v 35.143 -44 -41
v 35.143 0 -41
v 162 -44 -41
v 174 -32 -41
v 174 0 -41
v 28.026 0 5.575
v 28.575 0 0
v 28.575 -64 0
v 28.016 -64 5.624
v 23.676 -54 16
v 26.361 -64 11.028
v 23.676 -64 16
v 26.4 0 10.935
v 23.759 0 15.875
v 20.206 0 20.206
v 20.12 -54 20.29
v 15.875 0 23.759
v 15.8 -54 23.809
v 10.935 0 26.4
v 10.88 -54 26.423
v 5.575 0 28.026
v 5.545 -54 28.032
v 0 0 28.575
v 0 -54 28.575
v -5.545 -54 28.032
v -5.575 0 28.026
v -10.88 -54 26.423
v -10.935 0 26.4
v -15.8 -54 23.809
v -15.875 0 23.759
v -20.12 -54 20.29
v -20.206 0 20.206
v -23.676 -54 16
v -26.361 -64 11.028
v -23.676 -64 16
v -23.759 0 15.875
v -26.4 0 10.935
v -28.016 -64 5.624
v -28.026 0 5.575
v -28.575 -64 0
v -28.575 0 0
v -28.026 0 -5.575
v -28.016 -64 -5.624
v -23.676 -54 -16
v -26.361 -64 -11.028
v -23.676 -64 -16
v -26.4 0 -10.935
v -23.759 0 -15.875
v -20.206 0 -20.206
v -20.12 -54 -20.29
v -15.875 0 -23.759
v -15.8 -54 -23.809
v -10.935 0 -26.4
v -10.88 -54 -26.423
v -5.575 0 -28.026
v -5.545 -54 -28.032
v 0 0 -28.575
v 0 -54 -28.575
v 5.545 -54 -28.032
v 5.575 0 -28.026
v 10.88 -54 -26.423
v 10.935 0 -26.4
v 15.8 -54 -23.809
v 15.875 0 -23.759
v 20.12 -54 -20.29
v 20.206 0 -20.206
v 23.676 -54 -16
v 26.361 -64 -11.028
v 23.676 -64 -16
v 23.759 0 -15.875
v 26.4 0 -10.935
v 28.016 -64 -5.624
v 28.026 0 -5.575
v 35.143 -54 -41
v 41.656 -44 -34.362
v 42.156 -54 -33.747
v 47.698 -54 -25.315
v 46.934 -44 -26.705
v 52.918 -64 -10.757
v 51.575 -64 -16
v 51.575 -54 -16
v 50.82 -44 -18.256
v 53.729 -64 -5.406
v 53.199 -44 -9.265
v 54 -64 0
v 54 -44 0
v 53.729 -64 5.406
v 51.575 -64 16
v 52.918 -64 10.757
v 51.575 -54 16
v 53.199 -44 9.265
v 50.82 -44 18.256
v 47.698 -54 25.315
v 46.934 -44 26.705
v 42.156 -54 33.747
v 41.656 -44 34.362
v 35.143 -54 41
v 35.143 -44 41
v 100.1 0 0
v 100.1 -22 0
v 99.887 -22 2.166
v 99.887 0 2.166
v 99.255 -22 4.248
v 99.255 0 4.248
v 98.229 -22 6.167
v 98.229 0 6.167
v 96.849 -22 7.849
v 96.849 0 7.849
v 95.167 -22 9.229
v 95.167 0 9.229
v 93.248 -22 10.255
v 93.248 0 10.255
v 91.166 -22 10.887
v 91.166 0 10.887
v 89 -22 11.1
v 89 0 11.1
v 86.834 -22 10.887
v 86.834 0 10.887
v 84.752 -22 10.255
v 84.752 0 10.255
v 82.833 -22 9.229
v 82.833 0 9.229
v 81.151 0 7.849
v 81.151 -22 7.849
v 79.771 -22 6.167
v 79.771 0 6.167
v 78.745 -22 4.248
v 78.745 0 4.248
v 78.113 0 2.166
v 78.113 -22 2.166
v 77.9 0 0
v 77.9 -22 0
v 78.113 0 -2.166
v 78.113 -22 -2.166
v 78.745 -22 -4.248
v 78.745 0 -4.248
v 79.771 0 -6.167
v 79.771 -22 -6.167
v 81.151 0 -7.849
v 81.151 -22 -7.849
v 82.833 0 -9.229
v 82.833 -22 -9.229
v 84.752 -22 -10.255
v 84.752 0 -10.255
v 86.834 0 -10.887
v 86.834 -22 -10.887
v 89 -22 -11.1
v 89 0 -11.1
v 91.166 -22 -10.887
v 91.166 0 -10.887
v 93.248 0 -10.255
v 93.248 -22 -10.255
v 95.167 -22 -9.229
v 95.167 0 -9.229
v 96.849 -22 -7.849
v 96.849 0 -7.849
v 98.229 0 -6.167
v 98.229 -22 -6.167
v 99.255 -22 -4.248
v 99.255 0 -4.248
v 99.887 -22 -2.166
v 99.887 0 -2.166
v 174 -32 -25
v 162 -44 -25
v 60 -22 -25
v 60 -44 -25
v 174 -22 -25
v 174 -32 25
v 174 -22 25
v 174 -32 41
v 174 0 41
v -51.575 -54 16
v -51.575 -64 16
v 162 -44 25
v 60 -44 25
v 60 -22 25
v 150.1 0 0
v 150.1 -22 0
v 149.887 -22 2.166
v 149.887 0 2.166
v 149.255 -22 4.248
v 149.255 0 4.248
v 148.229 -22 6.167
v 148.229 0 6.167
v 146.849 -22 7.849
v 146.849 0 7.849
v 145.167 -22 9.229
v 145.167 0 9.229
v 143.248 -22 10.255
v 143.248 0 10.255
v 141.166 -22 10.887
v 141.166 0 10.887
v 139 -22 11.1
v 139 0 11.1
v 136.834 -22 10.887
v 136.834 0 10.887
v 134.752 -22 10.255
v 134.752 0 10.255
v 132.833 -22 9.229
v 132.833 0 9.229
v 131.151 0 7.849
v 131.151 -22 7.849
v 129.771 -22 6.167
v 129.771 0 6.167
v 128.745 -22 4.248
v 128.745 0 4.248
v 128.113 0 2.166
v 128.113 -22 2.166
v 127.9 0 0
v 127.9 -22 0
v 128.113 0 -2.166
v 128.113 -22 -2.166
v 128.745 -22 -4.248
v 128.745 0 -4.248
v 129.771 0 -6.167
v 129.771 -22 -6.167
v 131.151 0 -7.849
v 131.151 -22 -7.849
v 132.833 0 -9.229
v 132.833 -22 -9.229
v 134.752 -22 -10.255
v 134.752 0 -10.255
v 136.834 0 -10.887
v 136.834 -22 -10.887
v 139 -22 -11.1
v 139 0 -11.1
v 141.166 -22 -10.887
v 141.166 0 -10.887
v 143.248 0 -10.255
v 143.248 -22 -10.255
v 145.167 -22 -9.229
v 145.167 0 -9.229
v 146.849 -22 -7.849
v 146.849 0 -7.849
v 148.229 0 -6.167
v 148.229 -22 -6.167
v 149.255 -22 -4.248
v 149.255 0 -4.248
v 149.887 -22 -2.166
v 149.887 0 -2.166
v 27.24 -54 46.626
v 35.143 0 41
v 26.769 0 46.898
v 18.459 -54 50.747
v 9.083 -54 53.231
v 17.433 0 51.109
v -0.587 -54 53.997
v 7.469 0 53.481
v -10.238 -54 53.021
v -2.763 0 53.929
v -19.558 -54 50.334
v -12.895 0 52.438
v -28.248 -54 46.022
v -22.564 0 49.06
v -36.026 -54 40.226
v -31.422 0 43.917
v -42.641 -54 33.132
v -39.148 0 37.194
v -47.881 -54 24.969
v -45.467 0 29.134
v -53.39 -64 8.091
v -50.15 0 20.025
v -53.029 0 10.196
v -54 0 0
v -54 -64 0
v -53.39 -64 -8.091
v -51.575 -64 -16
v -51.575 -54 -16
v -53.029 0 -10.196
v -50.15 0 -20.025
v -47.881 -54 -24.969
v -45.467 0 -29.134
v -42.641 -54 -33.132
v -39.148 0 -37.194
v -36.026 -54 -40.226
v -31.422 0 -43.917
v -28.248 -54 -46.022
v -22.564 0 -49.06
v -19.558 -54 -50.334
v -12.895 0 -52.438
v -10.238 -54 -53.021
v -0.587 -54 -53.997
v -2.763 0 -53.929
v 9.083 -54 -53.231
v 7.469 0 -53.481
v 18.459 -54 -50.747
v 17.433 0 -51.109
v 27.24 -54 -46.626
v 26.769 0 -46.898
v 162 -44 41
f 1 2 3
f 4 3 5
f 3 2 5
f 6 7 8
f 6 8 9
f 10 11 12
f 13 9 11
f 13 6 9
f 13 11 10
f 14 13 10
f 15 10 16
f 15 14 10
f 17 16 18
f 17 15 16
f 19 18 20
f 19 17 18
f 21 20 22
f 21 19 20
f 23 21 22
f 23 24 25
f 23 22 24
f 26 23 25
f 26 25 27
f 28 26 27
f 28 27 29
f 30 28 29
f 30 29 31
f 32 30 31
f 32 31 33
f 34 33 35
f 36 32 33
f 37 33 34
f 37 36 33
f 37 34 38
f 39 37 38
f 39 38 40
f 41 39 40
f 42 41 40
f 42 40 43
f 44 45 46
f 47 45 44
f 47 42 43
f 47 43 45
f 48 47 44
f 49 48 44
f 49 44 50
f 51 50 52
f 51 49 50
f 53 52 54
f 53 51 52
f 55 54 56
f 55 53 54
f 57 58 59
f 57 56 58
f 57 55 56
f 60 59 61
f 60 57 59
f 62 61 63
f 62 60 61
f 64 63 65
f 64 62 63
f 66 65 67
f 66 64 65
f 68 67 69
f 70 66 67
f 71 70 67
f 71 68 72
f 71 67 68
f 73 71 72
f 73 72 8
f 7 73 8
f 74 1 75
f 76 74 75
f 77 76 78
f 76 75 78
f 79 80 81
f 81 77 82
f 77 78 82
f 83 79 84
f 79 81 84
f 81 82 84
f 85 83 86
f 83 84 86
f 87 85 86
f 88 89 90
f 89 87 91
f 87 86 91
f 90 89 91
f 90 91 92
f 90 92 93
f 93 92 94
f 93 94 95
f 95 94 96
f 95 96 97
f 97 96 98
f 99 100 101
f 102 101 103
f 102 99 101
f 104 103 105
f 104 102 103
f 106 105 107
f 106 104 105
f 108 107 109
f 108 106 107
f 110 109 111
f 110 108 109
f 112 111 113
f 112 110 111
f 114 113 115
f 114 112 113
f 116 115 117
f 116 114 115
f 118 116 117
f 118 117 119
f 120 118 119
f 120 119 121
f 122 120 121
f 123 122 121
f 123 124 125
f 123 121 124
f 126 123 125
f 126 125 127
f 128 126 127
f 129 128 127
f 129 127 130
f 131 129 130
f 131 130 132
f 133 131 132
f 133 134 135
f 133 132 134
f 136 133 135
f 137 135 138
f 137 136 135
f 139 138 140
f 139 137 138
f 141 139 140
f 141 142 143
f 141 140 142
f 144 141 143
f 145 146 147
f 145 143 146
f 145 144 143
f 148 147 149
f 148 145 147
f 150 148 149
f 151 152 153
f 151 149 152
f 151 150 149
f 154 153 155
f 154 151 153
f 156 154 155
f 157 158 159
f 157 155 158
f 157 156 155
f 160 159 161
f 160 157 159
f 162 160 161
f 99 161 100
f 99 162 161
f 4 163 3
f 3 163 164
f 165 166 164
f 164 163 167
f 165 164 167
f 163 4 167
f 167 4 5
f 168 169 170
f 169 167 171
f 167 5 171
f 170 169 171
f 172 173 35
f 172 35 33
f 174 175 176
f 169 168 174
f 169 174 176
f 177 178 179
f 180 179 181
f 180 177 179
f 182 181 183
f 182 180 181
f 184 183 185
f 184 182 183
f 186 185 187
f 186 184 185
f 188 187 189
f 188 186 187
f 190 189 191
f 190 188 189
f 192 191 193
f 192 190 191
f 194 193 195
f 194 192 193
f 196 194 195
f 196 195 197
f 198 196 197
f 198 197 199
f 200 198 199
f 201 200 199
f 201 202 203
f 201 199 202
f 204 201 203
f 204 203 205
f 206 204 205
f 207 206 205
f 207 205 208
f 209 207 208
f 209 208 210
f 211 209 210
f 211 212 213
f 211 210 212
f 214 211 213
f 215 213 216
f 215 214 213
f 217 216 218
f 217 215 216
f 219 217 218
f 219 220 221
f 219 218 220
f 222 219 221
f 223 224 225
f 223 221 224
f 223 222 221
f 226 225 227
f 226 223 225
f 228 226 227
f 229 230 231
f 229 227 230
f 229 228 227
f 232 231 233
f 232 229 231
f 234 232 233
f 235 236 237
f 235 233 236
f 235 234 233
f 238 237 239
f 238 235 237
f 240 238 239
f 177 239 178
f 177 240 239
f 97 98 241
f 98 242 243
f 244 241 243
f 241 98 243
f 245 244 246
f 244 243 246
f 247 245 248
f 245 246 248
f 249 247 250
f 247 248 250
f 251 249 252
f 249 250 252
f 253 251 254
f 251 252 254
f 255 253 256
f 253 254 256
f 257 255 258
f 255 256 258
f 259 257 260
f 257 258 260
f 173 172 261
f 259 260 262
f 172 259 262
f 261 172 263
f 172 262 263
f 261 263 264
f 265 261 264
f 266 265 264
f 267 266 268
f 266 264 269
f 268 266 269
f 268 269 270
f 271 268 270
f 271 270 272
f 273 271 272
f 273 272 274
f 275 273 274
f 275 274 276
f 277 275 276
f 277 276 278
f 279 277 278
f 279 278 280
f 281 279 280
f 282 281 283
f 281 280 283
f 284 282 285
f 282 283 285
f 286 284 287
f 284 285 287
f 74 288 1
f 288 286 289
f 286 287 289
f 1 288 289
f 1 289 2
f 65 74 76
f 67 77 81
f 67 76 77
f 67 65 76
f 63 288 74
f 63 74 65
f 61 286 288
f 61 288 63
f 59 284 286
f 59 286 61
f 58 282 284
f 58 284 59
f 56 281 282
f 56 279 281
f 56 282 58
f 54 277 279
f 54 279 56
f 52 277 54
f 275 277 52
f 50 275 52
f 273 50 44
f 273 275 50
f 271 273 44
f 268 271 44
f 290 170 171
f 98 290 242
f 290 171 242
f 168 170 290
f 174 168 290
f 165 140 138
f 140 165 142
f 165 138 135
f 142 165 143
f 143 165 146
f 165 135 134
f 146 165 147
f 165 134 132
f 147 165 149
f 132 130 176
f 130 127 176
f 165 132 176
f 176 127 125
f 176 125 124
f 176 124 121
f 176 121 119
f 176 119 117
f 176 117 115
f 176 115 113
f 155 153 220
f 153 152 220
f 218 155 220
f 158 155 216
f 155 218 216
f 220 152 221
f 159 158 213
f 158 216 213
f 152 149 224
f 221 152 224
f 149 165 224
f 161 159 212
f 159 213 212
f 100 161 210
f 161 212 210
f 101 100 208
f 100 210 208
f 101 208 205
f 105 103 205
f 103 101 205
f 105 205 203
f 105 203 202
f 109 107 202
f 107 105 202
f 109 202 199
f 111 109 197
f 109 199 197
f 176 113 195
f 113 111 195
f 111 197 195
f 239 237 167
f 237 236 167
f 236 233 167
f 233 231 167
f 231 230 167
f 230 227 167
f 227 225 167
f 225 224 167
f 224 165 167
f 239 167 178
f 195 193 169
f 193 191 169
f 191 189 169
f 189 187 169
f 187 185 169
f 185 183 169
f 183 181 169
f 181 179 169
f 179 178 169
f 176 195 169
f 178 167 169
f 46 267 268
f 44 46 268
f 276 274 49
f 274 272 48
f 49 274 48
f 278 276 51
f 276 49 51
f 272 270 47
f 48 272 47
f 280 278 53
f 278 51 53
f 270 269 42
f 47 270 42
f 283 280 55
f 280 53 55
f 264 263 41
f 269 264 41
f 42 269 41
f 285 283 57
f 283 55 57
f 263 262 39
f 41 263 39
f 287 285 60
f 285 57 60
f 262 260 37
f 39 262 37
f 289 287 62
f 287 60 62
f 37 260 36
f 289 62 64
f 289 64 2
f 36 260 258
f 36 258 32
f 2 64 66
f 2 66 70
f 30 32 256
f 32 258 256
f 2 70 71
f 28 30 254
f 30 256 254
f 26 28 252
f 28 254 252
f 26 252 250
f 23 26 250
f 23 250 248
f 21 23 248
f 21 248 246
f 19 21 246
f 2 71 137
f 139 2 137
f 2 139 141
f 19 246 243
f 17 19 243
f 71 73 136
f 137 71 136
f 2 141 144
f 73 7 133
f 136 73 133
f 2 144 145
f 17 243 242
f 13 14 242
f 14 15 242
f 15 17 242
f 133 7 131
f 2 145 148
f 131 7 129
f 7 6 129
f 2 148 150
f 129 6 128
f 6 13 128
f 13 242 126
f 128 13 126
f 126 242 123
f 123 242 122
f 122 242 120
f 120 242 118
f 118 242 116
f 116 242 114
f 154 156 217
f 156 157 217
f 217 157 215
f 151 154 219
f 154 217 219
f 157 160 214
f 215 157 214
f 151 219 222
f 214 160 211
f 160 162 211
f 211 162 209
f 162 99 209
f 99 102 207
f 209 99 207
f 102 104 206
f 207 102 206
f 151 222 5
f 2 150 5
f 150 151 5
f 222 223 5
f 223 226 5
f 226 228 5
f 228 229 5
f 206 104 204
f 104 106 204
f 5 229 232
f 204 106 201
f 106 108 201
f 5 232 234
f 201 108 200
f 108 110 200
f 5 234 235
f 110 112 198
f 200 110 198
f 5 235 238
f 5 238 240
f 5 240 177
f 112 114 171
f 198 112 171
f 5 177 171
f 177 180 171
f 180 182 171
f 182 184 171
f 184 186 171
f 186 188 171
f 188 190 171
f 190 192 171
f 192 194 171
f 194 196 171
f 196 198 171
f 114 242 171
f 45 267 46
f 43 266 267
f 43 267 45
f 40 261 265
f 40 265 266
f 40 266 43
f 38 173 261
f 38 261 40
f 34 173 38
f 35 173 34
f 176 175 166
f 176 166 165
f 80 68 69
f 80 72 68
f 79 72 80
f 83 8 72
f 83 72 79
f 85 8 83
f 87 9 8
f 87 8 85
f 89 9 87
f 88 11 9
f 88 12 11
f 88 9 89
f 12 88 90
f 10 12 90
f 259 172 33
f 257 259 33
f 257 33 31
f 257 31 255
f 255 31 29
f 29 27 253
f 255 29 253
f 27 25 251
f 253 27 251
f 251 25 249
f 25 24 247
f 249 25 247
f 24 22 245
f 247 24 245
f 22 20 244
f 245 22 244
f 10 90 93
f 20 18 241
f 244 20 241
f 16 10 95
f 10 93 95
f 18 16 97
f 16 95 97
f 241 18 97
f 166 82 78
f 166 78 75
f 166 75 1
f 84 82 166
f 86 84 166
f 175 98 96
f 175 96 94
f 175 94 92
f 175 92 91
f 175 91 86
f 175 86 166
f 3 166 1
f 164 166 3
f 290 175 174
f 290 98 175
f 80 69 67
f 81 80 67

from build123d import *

# Parameters (mm, degrees)
F0_R     = 28.575
F1_DEPTH = 64
F0_R_2   = 11.1
F2_DEPTH = 44
F3_W     = 10
F3_H     = 38
F4_DEPTH = 54
F6_W     = 22
F6_H     = 50
F7_DEPTH = 114
F9_DEPTH = 41


with BuildPart() as f1:
    # F0 (on Front) → F1 (new body)
    with BuildSketch(Plane.XZ):
        with BuildLine():
            ThreePointArc((35.1425667816, -41), (49.0596504584, -22.5643678594), (54, 0))
            ThreePointArc((54, 0), (49.0596504584, 22.5643678594), (35.1425667816, 41))
            ThreePointArc((35.1425667816, 41), (-54, 0), (35.1425667816, -41))
        make_face()
        Circle(F0_R, mode=Mode.SUBTRACT)
    extrude(amount=F1_DEPTH)

    # F0 (on Front) → F2 (join)
    with BuildSketch(Plane.XZ):
        with BuildLine():
            ThreePointArc((35.1425667816, 41), (49.0596504584, 22.5643678594), (54, 0))
            ThreePointArc((54, 0), (49.0596504584, -22.5643678594), (35.1425667816, -41))
            Line((35.1425667816, -41), (174, -41))
            Line((174, -41), (174, 41))
            Line((174, 41), (35.1425667816, 41))
        make_face()
        with Locations((89, 0)):
            Circle(F0_R_2, mode=Mode.SUBTRACT)
        with Locations((139, 0)):
            Circle(F0_R_2, mode=Mode.SUBTRACT)
    extrude(amount=F2_DEPTH)

    # F3 (on Right) → F4 (cut, symmetric)
    with BuildSketch(Plane.YZ):
        with Locations((-59, -35)):
            Rectangle(F3_W, F3_H)
        with Locations((-59, 35)):
            Rectangle(F3_W, F3_H)
    extrude(amount=F4_DEPTH, both=True, mode=Mode.SUBTRACT)

    # F6 (on offset) → F7 (cut)
    with BuildSketch(Plane.YZ.offset(174)):
        with Locations((-33, 0)):
            Rectangle(F6_W, F6_H)
    extrude(amount=-F7_DEPTH, mode=Mode.SUBTRACT)

    # F8 (on Top) → F9 (cut, symmetric)
    with BuildSketch(Plane.XY):
        Polygon((174, -32), (162, -44), (174, -44), align=None)
    extrude(amount=F9_DEPTH, both=True, mode=Mode.SUBTRACT)


solid = f1.part
